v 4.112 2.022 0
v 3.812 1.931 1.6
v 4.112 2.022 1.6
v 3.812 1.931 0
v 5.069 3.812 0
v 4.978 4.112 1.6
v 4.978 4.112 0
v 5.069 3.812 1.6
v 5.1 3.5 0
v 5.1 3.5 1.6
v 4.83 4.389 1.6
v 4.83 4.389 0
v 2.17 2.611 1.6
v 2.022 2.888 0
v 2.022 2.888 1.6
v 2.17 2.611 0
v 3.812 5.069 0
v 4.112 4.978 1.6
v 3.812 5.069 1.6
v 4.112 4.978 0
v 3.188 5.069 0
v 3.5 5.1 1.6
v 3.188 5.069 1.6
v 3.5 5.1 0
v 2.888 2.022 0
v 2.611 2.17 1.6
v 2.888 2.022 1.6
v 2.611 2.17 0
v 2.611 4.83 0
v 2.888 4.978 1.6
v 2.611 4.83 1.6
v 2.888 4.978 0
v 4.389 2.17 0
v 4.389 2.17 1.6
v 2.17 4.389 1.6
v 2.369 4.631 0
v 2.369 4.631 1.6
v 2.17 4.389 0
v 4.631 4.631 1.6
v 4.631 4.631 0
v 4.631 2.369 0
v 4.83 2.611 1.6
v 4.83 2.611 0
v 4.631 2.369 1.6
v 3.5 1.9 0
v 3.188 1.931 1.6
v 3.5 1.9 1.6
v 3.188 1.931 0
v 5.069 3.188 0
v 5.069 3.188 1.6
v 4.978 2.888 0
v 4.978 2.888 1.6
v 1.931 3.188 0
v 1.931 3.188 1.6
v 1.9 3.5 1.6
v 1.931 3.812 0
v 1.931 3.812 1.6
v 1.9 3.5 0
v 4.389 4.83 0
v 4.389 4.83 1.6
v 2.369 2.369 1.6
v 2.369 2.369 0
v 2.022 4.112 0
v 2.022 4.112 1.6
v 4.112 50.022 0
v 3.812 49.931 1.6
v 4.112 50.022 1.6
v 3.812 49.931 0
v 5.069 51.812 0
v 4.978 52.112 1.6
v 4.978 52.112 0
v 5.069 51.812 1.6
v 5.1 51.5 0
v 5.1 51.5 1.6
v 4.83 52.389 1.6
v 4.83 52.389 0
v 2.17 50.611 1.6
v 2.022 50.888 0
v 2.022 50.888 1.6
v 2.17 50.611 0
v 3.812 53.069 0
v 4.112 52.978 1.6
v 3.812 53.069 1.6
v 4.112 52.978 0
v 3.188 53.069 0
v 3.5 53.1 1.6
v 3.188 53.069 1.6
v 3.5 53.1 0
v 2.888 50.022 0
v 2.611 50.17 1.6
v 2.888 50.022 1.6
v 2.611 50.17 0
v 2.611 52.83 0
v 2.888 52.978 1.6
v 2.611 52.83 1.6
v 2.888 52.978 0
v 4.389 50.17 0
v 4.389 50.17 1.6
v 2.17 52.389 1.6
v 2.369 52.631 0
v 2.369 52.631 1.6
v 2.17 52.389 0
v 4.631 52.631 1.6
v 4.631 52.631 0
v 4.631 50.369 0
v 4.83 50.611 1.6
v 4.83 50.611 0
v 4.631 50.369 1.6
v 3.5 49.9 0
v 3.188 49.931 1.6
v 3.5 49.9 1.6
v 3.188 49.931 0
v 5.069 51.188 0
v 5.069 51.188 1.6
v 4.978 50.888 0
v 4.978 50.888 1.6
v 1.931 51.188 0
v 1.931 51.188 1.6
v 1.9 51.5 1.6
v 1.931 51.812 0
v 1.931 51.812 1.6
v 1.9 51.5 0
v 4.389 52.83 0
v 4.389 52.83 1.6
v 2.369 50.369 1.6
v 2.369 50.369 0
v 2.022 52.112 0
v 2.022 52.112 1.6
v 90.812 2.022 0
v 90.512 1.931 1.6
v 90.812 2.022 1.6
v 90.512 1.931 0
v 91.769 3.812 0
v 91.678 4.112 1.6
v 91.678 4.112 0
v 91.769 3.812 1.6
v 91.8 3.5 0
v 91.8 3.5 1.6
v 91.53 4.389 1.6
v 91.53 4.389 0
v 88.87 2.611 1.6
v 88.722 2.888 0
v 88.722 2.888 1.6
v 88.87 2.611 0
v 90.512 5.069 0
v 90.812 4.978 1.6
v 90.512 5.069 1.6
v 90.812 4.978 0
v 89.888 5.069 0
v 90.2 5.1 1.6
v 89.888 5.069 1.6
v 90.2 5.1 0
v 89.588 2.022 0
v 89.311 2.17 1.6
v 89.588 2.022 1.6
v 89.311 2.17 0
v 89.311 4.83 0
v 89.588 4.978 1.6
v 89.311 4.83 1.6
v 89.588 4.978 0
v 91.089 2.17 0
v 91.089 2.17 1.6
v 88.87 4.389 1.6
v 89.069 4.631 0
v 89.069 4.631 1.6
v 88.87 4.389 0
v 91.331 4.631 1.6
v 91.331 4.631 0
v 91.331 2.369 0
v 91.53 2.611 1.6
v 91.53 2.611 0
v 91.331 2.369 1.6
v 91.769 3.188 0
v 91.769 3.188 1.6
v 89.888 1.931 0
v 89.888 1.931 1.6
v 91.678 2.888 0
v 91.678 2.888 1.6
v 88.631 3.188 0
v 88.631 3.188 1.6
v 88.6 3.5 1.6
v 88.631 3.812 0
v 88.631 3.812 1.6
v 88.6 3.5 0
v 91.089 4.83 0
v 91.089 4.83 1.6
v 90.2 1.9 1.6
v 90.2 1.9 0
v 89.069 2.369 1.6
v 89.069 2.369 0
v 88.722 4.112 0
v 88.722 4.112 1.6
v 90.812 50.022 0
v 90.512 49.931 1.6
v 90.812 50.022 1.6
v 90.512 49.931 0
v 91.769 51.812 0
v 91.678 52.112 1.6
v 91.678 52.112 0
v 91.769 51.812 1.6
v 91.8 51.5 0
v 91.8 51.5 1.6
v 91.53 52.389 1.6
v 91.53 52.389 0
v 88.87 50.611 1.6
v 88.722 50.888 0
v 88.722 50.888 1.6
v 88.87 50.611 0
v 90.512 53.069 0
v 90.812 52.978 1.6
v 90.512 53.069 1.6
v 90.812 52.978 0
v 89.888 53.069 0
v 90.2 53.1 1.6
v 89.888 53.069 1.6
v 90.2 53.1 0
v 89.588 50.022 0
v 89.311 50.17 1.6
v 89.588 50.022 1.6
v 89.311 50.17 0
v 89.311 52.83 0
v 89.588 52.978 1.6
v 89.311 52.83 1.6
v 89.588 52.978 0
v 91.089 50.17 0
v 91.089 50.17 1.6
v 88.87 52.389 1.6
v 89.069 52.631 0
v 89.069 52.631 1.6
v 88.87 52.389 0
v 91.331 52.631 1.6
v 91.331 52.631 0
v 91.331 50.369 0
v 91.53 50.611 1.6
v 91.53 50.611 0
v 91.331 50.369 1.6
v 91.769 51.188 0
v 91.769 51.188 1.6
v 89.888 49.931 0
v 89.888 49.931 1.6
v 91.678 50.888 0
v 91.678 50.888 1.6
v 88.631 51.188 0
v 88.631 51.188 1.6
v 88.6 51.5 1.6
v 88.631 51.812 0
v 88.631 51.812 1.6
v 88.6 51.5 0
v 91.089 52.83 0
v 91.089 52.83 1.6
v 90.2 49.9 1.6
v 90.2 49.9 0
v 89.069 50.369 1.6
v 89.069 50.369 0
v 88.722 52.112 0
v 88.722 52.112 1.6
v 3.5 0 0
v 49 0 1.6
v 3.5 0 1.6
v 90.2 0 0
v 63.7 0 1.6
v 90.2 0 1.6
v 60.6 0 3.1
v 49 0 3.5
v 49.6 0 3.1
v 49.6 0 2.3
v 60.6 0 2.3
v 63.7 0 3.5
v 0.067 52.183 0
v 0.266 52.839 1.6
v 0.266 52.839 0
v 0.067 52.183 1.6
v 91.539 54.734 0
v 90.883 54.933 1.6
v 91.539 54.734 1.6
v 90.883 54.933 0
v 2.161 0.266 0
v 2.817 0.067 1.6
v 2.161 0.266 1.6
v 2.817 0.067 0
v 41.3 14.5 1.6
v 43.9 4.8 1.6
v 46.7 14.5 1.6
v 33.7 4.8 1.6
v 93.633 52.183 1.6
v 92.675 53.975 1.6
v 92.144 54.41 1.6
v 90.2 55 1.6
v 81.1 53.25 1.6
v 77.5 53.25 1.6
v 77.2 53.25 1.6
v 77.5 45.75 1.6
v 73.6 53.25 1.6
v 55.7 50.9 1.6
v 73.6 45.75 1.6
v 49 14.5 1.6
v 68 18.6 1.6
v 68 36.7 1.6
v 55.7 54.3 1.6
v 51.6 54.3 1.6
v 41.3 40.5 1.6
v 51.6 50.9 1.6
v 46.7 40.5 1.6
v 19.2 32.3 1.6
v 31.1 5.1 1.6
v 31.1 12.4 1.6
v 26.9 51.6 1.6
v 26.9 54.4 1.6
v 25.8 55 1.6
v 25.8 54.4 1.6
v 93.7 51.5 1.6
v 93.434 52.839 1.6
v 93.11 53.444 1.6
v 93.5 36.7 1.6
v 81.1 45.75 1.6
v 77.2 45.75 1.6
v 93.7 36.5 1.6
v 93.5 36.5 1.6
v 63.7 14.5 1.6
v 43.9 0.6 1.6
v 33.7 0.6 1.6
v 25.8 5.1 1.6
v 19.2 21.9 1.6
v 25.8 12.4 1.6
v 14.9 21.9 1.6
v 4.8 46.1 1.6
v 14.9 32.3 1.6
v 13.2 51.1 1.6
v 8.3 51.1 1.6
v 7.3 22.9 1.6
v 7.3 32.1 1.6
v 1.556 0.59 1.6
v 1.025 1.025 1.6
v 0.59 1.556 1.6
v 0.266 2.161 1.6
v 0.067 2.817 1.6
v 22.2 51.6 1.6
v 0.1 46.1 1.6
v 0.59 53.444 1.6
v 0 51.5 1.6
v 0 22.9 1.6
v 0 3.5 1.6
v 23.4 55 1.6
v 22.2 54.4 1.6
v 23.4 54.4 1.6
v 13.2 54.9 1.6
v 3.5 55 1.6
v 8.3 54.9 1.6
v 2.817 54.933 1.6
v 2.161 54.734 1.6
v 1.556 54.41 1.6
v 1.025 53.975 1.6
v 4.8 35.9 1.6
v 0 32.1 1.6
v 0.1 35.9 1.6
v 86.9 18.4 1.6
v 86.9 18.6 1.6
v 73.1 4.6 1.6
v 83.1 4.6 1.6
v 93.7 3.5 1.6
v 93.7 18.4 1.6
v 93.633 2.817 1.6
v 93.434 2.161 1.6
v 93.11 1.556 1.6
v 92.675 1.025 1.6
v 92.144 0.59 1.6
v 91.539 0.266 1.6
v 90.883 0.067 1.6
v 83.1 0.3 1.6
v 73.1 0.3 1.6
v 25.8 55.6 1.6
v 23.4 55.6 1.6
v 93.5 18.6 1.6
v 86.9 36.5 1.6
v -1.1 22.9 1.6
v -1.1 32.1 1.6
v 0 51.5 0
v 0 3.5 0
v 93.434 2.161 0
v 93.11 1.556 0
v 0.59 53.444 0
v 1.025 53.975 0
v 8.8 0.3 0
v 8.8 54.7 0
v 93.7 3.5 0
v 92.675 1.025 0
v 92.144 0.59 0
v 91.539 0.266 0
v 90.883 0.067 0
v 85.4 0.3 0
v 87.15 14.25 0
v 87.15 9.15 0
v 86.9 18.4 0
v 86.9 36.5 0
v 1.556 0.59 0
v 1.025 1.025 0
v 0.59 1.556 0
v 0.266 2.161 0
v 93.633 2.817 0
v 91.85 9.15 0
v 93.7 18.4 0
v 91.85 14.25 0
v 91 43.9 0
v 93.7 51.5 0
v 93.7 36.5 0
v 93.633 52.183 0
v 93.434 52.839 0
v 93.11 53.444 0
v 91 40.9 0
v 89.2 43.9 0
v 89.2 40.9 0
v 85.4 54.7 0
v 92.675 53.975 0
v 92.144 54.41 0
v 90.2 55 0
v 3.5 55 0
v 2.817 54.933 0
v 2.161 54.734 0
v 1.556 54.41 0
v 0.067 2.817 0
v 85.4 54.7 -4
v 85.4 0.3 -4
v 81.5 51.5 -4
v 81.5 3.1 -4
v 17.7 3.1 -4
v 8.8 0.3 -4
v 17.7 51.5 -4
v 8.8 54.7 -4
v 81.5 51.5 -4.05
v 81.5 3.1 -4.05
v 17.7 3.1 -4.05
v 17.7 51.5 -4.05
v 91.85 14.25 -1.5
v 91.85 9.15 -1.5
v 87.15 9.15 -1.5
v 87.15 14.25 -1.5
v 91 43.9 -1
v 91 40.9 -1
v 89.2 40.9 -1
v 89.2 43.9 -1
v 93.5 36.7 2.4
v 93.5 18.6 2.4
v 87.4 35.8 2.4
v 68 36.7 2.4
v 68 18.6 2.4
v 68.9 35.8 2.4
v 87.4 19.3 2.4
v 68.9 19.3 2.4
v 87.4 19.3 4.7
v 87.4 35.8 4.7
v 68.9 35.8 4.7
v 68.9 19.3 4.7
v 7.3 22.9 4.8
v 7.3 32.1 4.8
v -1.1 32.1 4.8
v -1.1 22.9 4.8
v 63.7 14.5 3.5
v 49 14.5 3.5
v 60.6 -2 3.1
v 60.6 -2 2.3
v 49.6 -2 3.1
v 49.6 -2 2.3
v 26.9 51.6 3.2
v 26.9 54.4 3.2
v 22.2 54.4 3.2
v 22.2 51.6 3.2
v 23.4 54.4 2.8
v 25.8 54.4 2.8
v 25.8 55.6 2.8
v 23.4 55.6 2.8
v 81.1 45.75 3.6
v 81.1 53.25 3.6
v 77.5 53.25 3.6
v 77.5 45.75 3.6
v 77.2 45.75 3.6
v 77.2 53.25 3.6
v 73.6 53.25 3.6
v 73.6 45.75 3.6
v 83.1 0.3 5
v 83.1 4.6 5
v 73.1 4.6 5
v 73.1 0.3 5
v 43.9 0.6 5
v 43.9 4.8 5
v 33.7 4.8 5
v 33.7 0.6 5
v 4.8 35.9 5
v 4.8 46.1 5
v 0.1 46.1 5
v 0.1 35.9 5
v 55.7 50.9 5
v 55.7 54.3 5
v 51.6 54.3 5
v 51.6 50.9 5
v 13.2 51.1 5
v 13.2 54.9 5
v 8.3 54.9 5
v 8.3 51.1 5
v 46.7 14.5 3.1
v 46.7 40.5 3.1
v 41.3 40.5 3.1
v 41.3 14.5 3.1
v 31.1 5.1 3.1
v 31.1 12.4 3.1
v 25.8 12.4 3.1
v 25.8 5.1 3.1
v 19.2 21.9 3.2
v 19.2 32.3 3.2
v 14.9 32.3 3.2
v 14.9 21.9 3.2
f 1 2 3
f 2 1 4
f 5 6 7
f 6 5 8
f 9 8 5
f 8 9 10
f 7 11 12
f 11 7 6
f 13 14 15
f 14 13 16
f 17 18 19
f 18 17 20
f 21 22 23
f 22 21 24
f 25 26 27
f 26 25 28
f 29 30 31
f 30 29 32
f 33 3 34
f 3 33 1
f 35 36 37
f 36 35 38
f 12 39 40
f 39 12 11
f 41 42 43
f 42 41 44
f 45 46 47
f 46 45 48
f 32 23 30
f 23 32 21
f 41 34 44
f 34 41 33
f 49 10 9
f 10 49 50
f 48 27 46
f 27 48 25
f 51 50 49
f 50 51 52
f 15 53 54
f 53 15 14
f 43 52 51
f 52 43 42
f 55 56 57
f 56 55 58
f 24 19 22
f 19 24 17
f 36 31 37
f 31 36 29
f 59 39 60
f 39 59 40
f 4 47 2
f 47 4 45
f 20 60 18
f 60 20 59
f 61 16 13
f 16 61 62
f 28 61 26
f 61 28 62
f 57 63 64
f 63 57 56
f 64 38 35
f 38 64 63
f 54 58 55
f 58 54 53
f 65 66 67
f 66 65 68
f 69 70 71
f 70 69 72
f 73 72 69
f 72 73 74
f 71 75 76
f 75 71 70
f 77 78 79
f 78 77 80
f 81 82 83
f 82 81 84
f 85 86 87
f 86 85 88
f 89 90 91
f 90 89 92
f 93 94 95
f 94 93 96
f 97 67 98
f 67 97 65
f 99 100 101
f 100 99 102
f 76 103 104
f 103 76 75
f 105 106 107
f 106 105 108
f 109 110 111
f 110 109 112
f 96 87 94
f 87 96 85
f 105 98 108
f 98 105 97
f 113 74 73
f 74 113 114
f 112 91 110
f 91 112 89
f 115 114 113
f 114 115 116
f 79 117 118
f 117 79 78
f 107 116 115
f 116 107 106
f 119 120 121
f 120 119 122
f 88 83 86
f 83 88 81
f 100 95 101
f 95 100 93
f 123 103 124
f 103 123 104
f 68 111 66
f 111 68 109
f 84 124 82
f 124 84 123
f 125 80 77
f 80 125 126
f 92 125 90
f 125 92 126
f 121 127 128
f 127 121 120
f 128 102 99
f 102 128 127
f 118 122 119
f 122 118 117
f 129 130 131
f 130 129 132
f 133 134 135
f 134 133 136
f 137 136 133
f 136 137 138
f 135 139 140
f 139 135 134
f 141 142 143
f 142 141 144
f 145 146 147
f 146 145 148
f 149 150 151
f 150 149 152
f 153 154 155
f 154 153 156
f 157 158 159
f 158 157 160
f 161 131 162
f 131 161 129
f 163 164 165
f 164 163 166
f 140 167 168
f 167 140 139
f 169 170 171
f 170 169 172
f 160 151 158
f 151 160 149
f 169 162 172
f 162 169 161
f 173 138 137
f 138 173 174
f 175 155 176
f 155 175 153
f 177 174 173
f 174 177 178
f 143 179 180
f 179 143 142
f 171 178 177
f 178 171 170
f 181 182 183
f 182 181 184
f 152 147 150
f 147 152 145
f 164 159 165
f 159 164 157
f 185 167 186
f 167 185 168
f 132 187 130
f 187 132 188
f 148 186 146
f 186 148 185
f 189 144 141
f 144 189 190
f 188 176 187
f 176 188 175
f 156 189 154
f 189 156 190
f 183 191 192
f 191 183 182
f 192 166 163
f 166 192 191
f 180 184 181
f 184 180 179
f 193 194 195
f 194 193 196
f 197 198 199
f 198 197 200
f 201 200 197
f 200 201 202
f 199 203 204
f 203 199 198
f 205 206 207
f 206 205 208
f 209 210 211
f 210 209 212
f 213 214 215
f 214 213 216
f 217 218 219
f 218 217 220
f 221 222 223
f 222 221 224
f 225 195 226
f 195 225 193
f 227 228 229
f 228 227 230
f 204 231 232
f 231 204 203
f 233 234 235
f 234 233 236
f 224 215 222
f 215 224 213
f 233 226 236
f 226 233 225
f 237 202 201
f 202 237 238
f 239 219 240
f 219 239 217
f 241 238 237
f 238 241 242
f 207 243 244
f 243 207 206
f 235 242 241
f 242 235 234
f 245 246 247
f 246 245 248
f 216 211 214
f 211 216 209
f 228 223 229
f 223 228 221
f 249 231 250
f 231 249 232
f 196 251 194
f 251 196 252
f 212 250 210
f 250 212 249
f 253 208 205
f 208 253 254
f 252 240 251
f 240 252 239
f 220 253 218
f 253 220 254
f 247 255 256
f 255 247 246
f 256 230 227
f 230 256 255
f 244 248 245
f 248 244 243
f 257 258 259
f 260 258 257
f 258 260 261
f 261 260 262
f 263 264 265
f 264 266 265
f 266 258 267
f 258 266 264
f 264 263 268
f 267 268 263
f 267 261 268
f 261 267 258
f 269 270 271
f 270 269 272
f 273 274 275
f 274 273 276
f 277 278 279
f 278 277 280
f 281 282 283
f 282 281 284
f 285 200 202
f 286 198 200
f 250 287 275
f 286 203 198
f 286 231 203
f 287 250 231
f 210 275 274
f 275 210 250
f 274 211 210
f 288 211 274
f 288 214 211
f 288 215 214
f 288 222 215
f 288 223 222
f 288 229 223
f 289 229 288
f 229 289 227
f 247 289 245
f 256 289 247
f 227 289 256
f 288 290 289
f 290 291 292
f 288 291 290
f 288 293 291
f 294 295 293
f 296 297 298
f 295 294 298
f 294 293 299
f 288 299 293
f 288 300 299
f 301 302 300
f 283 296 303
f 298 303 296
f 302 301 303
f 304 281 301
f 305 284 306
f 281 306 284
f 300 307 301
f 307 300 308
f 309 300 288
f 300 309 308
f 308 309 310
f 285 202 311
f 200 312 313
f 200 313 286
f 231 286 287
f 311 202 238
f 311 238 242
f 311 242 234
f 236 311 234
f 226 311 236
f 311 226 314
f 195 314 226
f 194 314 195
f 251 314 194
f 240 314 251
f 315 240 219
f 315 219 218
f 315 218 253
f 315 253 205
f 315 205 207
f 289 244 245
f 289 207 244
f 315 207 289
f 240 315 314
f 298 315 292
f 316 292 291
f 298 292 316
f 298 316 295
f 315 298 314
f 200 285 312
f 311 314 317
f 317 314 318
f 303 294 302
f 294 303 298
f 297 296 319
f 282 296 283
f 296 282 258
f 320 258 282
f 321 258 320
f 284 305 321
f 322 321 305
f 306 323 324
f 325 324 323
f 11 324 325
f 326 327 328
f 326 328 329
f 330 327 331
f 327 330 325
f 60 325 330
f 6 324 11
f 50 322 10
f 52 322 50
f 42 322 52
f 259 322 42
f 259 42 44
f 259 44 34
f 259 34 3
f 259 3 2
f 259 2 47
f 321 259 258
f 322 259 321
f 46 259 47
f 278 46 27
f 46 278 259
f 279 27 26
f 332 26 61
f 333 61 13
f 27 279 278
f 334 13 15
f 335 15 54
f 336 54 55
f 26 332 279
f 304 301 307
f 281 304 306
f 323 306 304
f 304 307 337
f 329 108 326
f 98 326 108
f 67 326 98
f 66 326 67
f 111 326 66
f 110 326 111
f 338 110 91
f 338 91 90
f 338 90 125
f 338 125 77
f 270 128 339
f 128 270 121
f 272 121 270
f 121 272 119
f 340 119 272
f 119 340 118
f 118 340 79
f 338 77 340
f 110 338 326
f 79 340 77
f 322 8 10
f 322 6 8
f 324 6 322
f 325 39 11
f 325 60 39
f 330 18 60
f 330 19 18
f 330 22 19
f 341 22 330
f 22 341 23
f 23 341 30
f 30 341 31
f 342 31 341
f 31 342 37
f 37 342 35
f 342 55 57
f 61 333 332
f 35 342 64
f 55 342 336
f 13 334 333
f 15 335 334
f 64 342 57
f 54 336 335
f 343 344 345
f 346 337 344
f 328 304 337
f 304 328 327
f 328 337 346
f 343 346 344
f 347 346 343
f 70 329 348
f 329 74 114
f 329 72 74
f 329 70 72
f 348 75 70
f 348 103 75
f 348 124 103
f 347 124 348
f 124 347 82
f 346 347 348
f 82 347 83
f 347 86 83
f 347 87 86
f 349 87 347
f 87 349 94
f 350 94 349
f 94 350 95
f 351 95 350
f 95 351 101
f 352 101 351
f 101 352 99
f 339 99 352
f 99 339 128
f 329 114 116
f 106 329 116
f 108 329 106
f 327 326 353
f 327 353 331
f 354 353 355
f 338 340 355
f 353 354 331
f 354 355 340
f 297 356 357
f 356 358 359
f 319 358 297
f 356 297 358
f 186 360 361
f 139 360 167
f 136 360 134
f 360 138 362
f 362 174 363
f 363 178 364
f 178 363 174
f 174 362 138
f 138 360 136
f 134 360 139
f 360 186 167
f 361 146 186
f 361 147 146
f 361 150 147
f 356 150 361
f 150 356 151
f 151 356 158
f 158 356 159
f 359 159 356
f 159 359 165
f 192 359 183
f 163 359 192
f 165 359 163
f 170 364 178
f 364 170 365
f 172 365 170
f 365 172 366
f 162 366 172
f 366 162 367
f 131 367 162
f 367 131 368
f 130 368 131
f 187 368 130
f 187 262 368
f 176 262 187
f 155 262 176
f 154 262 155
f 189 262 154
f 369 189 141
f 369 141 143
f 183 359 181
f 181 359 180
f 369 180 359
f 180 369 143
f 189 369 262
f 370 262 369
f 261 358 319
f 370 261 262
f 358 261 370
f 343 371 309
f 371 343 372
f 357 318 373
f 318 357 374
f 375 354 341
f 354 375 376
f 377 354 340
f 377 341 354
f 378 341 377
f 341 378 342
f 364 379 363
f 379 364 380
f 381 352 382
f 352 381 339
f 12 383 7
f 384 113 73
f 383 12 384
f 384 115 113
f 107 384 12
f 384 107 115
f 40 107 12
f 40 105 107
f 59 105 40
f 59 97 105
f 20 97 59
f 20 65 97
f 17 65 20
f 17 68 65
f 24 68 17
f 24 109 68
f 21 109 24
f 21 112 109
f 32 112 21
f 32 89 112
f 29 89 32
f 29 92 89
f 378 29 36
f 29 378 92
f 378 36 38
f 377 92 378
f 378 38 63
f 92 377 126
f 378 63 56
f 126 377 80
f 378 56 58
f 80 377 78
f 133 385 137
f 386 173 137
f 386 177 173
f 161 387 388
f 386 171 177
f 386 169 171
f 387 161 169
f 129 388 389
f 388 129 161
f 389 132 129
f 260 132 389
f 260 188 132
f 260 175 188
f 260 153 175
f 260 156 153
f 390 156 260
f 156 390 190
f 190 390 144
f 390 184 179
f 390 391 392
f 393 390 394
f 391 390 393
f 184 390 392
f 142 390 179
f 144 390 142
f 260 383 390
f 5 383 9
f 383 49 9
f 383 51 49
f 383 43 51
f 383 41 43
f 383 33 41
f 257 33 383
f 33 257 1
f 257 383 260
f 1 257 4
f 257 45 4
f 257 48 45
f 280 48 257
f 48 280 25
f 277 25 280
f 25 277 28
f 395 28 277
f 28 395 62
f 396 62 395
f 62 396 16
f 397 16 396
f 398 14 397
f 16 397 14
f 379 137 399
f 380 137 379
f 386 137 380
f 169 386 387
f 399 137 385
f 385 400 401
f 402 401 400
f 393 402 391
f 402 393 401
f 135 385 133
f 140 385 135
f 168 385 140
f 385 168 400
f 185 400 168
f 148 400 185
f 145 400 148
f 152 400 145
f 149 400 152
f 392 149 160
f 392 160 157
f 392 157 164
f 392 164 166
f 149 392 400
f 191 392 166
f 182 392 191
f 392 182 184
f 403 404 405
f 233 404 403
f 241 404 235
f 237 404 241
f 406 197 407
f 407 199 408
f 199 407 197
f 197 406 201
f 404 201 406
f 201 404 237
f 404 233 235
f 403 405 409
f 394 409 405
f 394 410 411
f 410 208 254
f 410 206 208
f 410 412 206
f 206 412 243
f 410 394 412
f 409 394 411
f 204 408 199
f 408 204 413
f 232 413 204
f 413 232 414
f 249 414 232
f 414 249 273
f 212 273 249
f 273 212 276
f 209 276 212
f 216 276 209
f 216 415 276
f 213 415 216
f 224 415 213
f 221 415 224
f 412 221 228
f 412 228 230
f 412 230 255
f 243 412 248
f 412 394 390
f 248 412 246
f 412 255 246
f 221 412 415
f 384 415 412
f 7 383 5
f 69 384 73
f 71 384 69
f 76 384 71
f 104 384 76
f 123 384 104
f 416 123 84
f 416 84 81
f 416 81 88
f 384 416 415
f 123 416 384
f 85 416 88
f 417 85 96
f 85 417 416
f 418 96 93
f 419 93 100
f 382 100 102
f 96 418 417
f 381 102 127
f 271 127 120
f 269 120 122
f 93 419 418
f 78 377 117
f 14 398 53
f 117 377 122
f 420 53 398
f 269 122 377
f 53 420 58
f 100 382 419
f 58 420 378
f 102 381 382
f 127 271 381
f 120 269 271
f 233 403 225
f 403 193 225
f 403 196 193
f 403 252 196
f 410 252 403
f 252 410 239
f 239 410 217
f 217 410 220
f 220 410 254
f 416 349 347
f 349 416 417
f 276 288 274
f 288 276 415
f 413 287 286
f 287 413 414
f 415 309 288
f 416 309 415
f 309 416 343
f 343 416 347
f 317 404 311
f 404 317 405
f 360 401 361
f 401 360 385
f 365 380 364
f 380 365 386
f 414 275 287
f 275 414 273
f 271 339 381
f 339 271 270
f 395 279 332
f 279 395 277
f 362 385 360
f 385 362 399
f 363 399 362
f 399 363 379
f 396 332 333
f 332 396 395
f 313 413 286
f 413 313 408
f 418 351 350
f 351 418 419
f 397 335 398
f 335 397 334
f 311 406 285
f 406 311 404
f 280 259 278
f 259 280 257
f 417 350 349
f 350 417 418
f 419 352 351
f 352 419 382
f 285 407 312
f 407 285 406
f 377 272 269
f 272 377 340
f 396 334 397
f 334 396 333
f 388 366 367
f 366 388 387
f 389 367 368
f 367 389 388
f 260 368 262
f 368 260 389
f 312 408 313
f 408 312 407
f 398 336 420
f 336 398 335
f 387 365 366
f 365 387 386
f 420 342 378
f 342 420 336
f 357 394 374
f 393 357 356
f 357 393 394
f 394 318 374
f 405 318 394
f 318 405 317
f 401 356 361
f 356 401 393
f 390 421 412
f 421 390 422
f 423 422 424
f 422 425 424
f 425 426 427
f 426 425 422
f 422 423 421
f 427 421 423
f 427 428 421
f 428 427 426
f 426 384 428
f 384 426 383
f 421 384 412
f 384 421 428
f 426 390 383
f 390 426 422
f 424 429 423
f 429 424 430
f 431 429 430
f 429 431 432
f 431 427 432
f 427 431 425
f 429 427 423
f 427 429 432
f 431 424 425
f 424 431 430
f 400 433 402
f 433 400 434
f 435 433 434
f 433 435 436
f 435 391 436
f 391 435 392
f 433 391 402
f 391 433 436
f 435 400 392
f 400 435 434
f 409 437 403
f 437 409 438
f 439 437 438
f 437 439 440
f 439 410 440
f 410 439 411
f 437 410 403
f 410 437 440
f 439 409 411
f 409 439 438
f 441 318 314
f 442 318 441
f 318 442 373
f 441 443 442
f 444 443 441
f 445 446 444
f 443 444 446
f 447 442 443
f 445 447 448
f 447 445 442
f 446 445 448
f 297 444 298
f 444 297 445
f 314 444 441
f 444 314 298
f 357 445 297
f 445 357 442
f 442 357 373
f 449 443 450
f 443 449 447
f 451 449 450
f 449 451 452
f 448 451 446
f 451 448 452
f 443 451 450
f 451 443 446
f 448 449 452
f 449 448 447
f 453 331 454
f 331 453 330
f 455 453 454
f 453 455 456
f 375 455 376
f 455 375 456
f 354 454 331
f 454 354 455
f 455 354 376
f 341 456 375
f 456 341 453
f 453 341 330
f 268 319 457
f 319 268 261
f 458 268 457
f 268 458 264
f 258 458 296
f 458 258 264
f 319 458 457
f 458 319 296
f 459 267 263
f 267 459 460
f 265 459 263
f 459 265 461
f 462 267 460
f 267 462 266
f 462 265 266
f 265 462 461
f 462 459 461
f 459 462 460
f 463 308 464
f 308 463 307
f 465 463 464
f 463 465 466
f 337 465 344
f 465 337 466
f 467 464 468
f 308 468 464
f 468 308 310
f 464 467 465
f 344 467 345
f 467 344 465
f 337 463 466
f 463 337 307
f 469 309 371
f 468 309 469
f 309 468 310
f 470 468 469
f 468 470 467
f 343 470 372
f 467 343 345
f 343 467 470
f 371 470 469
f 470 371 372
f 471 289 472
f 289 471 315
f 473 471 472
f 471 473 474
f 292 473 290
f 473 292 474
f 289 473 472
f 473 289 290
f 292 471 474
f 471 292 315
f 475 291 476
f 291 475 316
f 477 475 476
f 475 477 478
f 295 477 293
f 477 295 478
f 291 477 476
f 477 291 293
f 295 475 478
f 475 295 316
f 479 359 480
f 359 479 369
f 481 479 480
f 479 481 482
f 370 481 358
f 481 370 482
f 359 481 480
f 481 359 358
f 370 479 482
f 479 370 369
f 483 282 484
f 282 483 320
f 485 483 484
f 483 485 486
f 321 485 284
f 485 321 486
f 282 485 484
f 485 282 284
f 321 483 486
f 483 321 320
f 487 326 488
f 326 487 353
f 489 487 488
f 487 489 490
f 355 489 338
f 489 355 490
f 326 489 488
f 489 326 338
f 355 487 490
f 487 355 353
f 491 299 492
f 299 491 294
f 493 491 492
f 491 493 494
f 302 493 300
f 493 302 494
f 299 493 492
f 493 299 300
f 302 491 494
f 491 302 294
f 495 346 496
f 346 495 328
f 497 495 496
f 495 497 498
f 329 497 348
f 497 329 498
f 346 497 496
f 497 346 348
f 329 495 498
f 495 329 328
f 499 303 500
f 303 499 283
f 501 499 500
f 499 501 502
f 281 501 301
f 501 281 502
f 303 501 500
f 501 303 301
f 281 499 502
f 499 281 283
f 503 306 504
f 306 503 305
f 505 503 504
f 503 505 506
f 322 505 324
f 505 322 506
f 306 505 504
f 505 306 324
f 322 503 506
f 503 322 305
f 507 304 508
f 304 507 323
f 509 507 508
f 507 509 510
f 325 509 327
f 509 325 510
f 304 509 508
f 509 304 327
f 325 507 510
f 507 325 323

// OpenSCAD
// Reference model of the ESP32-2432S032C board (Sunton 3.2-inch display
// board, capacitive touch, USB-C). Not a printed part: it is here to check
// the case against.
//
// WHERE THE NUMBERS COME FROM (details and links: README.md)
//   [D]  printed on the manufacturer's dimension drawing: outline 93.7 x 55,
//        holes 3.2 mm at 3.5 mm from the edges.
//   [P]  scaled from pictures: the same drawing (front) and the vendor's
//        rendering of the back. About +-0.3 mm, and a rendering is not a
//        photograph of the board on the bench.
//   [C]  cross-checked against the openings of two published cases for this
//        board (USB-C, microSD, power switch, RESET, BOOT, P1, P3, CN1 agree
//        within about 0.5 mm).
//   [E]  estimate: nothing published. ALL COMPONENT HEIGHTS are [E] or
//        typical values for the part type. Measure before trusting a
//        clearance in Z.
//
// No published 3D model of this board was found (2026-11-18).
//
// Coordinates of board_reference(): origin at the board's corner at the
// USB-C end on the microSD side, on the SCREEN side of the PCB. X along the
// length away from USB-C, Y across away from the microSD edge, Z from the
// screen side of the PCB towards the back; the screen is at negative Z.
// This is how resonance_case.scad looks at the board.
//
// The positions below are written in the frame of the back-view picture
// they were measured in (u from the antenna end, v from the power-switch
// edge) and converted by at(): x = 93.7 - u, y = 55 - v.

brd_l = 93.7;            // [D]
brd_w = 55.0;            // [D]
brd_t = 1.6;             // [E] usual thickness; one case's ledge implies it
brd_hole_inset = 3.5;    // [D]
brd_hole_d = 3.2;        // [D]
brd_corner_r = 3.5;      // [E] rounded corners, radius not dimensioned
brd_lcd_h = 4.0;         // [C] upper bound: screen + touch glass above the PCB
brd_rear_h = 4.0;        // [C] upper bound: tallest part on the back

// Heights [E]
h_wroom = 3.1;           // module datasheet
h_usb = 3.2;             // USB-C mid-mount receptacle, typical
h_sd = 1.9;              // push-push microSD socket, typical
h_jst = 3.4;             // 1.25 mm side-entry header, typical
h_switch = 1.6;
h_tact = 2.0;            // RESET and BOOT
h_ic = 1.6;
h_fpc = 1.5;

// A block on the BACK of the board, given in the picture's frame:
// u0..u1 from the antenna end, v0..v1 from the power-switch edge.
module at(u0, u1, v0, v1, h, c = "dimgray") {
    color(c) translate([brd_l - u1, brd_w - v1, brd_t]) cube([u1 - u0, v1 - v0, h]);
}
// The same on the FRONT (screen side).
module at_front(u0, u1, v0, v1, h, c = "dimgray") {
    color(c) translate([brd_l - u1, brd_w - v1, -h]) cube([u1 - u0, v1 - v0, h]);
}

module board_pcb() {
    color("goldenrod") difference() {
        hull() for (x = [brd_corner_r, brd_l - brd_corner_r], y = [brd_corner_r, brd_w - brd_corner_r])
            translate([x, y, 0]) cylinder(r = brd_corner_r, h = brd_t, $fn = 32);
        for (x = [brd_hole_inset, brd_l - brd_hole_inset], y = [brd_hole_inset, brd_w - brd_hole_inset])
            translate([x, y, -1]) cylinder(d = brd_hole_d, h = brd_t + 2, $fn = 32);
        // Notch under the module's antenna. [P]
        translate([brd_l - 6.8, brd_w - 36.6, -1]) cube([6.8 + 1, 18.1, brd_t + 2]);
    }
}

module board_front() {
    // Display module with its touch glass. Outline [P]; height [C] bound.
    at_front(8.3, 84.9, 0.3, 54.7, brd_lcd_h, "black");
    // Lit area 64.8 x 48.6 (specification); position [P], +-0.5 along the length.
    color("lightskyblue") translate([brd_l - 76.0, brd_w - 51.9, -brd_lcd_h - 0.05]) cube([64.8 - 1.0, 48.4, 0.05]);
    // RGB LED (5050) and light sensor, beside the screen at the antenna end. [P][C]
    at_front(1.85, 6.55, 40.75, 45.85, 1.5, "white");
    at_front(2.7, 4.5, 11.1, 14.1, 1.0, "saddlebrown");
}

module board_back() {
    // ESP32-WROOM-32: module board and shield can. [P]; antenna over the notch.
    at(0.2, 25.7, 18.3, 36.4, 0.8, "black");
    at(6.3, 24.8, 19.2, 35.7, h_wroom, "silver");
    // USB-C: overhangs the end of the board by about 1.1 mm. [P][C]
    color("silver") translate([-1.1, 27.5 - 4.6, brd_t]) cube([8.4, 9.2, h_usb]);
    // microSD socket, flush with the edge. [P][C] The card's centre line is
    // about 1.2 mm off the socket's, at 55.1 mm from the USB-C end.
    at(30.0, 44.7, 40.5, 55.0, h_sd, "silver");
    // A card, pushed in: it stands about 2 mm out of the socket. [E]
    color("darkred") translate([brd_l - 38.6 - 5.5, -2, brd_t + 0.7]) cube([11, 12, 0.8]);
    // Power switch SW1 with its actuator over the edge. [P][C]
    at(66.8, 71.5, 0.6, 3.4, h_switch, "silver");
    at(67.9, 70.3, -0.6, 0.6, h_switch - 0.4, "black");
    // RESET and BOOT. [P][C]
    at(12.6, 16.2, 1.75, 9.25, h_tact, "silver");
    at(16.5, 20.1, 1.75, 9.25, h_tact, "silver");
    // 1.25 mm connectors. P3 and CN1 face the microSD edge, P1 the USB-C
    // end, speaker and battery the power-switch edge. [P]; P1, P3, CN1 also [C].
    at(10.6, 20.6, 50.4, 54.7, h_jst, "ivory");   // P3  "extended IO"
    at(49.8, 60.0, 50.2, 54.4, h_jst, "ivory");   // CN1 "temperature and humidity"
    at(88.9, 93.6, 8.9, 19.1, h_jst, "ivory");    // P1  serial / 5 V
    at(38.0, 42.1, 0.7, 4.1, h_jst, "ivory");     // speaker
    at(80.5, 85.4, 0.1, 3.9, h_jst, "orange");    // battery (P5)
    // Display and touch flat-cable connectors, and the largest IC. [P]
    at(47.0, 52.4, 14.5, 40.5, h_fpc, "ivory");
    at(62.6, 67.9, 42.6, 49.9, h_fpc, "ivory");
    at(74.5, 78.8, 22.7, 33.1, h_ic, "black");
}

module board_reference() {
    board_pcb();
    board_front();
    board_back();
}

// Shown when this file is opened by itself: back side up.
board_reference();
